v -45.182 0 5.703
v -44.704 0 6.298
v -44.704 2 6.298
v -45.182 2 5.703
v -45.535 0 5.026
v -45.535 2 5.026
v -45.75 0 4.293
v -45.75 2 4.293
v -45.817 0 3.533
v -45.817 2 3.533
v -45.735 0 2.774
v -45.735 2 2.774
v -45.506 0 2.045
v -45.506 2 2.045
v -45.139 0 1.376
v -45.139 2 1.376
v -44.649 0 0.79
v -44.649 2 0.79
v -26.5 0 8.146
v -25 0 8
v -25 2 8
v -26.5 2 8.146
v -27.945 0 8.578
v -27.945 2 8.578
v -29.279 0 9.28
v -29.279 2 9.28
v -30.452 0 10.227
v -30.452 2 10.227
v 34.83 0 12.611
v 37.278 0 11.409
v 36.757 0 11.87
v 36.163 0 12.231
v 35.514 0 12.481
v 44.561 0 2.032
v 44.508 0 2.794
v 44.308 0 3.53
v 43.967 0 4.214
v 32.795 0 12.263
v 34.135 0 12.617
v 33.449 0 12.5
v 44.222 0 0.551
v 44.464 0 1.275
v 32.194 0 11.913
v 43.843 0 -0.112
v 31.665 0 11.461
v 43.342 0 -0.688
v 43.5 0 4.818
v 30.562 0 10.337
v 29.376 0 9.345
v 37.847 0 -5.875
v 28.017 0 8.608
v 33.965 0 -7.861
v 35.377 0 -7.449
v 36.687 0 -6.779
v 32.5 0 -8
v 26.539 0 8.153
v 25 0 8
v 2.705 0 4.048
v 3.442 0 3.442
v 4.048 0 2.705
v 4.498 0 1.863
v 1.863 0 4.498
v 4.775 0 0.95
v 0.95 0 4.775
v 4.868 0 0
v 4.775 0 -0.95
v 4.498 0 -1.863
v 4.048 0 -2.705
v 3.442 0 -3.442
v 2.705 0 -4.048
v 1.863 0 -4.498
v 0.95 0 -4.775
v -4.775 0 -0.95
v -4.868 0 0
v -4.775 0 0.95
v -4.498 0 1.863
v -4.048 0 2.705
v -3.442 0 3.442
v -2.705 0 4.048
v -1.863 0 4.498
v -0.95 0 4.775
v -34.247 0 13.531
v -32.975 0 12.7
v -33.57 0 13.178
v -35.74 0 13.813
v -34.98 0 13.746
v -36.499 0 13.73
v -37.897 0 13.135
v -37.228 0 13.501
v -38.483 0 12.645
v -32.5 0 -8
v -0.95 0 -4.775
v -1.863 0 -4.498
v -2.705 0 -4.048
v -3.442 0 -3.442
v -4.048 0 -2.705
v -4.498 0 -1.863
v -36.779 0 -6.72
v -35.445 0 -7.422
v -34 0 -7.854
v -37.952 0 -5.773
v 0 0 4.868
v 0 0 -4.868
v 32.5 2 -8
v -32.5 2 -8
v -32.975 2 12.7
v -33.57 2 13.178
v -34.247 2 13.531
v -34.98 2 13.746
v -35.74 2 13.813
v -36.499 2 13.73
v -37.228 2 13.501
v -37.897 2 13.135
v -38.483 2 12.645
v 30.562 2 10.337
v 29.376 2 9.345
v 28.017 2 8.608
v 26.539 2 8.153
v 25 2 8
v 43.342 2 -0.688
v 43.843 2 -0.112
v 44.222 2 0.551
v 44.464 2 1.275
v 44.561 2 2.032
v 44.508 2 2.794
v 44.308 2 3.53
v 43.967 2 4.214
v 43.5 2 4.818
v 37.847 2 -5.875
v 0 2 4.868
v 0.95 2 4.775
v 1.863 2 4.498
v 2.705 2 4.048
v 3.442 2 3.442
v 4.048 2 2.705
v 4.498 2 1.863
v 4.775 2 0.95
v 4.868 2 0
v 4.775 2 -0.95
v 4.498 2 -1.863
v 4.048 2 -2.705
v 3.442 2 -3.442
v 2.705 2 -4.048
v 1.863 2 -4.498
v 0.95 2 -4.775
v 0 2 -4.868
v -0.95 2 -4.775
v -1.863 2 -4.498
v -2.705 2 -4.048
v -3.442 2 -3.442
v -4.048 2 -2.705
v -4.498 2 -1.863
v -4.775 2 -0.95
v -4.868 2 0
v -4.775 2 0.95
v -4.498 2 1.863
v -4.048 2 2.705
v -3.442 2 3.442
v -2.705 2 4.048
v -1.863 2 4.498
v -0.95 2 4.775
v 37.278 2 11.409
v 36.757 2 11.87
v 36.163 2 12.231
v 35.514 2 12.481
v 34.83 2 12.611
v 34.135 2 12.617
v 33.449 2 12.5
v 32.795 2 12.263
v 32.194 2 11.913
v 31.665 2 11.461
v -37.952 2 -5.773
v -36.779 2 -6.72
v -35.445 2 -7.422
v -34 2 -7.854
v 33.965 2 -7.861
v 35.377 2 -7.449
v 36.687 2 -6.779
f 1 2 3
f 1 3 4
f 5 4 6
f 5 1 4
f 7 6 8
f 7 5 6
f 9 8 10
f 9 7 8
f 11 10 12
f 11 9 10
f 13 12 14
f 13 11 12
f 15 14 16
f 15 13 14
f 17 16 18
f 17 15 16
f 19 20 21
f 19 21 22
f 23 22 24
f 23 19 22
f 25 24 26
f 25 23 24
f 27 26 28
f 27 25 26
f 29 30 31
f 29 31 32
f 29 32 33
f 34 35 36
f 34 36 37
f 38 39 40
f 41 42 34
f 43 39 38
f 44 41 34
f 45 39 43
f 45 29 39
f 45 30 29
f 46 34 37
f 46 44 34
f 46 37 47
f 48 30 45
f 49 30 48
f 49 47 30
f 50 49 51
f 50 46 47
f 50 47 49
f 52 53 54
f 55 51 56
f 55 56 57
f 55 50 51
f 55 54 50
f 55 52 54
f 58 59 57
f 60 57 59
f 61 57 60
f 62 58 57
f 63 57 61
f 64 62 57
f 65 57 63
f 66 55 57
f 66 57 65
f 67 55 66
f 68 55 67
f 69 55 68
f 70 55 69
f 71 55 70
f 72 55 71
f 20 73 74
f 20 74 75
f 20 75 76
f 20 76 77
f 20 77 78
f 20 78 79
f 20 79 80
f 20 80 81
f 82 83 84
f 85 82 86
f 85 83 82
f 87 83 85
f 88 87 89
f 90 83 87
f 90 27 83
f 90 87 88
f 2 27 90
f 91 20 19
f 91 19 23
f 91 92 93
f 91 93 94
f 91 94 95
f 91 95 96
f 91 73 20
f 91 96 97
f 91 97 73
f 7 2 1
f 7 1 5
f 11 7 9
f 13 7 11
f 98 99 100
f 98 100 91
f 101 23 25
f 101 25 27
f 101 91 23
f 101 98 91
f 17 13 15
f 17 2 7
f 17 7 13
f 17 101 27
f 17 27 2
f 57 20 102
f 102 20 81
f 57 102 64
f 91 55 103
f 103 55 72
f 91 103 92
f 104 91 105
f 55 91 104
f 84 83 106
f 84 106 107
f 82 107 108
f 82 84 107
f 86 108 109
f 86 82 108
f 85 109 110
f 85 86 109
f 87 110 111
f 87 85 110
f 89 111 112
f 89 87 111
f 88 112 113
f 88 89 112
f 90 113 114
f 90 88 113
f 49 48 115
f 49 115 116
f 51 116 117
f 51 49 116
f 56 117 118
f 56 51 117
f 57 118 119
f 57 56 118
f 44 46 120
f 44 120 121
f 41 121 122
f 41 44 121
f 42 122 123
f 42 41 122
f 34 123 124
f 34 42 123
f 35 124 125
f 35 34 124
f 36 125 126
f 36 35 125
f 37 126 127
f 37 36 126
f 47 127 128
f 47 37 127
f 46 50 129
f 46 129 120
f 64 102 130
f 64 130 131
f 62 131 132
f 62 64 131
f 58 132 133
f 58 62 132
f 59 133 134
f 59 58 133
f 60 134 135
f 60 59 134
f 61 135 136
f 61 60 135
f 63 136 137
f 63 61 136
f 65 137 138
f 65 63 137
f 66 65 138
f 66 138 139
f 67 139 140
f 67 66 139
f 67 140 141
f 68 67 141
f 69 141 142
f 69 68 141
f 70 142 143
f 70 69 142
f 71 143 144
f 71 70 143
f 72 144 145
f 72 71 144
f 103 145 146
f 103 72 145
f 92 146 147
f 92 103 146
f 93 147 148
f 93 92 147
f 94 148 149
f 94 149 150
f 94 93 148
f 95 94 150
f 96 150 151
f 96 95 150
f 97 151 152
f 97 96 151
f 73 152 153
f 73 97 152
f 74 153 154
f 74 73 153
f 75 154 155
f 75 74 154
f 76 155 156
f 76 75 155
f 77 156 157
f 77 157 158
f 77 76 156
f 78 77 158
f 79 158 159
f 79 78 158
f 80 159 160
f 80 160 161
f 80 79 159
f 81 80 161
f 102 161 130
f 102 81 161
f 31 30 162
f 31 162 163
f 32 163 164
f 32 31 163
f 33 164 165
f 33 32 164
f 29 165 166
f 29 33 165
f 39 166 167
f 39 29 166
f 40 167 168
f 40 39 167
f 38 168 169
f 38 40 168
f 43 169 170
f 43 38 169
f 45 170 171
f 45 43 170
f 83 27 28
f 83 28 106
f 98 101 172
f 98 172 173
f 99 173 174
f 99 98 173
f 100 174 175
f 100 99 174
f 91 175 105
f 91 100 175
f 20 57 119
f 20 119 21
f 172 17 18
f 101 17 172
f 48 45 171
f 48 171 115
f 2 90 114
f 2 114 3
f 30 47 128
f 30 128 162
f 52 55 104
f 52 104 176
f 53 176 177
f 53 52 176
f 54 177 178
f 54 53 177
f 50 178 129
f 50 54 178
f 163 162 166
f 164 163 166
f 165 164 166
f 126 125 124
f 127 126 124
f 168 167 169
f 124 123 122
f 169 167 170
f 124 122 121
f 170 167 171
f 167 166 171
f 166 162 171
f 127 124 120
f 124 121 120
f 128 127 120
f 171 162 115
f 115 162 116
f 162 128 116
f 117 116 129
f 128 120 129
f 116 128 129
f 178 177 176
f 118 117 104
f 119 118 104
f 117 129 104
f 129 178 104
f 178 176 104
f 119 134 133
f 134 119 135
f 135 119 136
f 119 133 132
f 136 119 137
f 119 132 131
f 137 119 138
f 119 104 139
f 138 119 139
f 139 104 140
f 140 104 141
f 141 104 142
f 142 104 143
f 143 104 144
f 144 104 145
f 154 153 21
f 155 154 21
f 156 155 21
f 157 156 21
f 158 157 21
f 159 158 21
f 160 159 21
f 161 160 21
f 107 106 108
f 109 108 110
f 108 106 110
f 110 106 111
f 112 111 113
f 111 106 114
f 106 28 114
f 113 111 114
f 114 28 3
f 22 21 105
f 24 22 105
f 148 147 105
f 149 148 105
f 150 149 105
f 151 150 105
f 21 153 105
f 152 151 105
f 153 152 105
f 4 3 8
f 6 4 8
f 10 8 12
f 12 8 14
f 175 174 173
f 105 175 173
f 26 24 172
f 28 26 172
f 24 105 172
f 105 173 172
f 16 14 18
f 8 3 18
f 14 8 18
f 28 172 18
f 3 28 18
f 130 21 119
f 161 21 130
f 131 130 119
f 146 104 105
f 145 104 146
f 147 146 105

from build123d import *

# Parameters (mm, degrees)
SKETCH2_R           = 4.868124445
BOSS_EXTRUDE1_DEPTH = 2


with BuildPart() as part:
    # Sketch2 → Boss-Extrude1 (new body)
    with BuildSketch(Plane(origin=(0, 0, 0), x_dir=(1, 0, 0), z_dir=(0, 1, 0))):
        with BuildLine():
            ThreePointArc((37.278070291, -11.408685578), (34.482702596, -12.629587927), (31.664894392, -11.461409849))
            Line((31.664894392, -11.461409849), (30.562457969, -10.336699734))
            ThreePointArc((30.562457969, -10.336699734), (28.016666385, -8.607896753), (25, -8))
            Line((25, -8), (-25, -8))
            ThreePointArc((-25, -8), (-27.944700918, -8.578087681), (-30.452299379, -10.226541143))
            Line((-30.452299379, -10.226541143), (-32.975396929, -12.699671418))
            ThreePointArc((-32.975396929, -12.699671418), (-35.740493562, -13.812747241), (-38.482775603, -12.644592123))
            Line((-38.482775603, -12.644592123), (-44.703876064, -6.297800167))
            ThreePointArc((-44.703876064, -6.297800167), (-45.816951887, -3.532703535), (-44.648796769, -0.790421493))
            Line((-44.648796769, -0.790421493), (-37.952299379, 5.773458857))
            ThreePointArc((-37.952299379, 5.773458857), (-35.444700918, 7.421912319), (-32.5, 8))
            Line((-32.5, 8), (32.5, 8))
            ThreePointArc((32.5, 8), (35.376842294, 7.449252444), (37.846850837, 5.874894716))
            Line((37.846850837, 5.874894716), (43.341622103, 0.687699611))
            ThreePointArc((43.341622103, 0.687699611), (44.561082794, -2.032155678), (43.500143599, -4.817672722))
            Line((43.500143599, -4.817672722), (37.278070291, -11.408685578))
        make_face()
        with Locations(Location((0, 0, 0), (0, 0, 270))):
            Circle(SKETCH2_R, mode=Mode.SUBTRACT)
    extrude(amount=BOSS_EXTRUDE1_DEPTH)


solid = part.part
